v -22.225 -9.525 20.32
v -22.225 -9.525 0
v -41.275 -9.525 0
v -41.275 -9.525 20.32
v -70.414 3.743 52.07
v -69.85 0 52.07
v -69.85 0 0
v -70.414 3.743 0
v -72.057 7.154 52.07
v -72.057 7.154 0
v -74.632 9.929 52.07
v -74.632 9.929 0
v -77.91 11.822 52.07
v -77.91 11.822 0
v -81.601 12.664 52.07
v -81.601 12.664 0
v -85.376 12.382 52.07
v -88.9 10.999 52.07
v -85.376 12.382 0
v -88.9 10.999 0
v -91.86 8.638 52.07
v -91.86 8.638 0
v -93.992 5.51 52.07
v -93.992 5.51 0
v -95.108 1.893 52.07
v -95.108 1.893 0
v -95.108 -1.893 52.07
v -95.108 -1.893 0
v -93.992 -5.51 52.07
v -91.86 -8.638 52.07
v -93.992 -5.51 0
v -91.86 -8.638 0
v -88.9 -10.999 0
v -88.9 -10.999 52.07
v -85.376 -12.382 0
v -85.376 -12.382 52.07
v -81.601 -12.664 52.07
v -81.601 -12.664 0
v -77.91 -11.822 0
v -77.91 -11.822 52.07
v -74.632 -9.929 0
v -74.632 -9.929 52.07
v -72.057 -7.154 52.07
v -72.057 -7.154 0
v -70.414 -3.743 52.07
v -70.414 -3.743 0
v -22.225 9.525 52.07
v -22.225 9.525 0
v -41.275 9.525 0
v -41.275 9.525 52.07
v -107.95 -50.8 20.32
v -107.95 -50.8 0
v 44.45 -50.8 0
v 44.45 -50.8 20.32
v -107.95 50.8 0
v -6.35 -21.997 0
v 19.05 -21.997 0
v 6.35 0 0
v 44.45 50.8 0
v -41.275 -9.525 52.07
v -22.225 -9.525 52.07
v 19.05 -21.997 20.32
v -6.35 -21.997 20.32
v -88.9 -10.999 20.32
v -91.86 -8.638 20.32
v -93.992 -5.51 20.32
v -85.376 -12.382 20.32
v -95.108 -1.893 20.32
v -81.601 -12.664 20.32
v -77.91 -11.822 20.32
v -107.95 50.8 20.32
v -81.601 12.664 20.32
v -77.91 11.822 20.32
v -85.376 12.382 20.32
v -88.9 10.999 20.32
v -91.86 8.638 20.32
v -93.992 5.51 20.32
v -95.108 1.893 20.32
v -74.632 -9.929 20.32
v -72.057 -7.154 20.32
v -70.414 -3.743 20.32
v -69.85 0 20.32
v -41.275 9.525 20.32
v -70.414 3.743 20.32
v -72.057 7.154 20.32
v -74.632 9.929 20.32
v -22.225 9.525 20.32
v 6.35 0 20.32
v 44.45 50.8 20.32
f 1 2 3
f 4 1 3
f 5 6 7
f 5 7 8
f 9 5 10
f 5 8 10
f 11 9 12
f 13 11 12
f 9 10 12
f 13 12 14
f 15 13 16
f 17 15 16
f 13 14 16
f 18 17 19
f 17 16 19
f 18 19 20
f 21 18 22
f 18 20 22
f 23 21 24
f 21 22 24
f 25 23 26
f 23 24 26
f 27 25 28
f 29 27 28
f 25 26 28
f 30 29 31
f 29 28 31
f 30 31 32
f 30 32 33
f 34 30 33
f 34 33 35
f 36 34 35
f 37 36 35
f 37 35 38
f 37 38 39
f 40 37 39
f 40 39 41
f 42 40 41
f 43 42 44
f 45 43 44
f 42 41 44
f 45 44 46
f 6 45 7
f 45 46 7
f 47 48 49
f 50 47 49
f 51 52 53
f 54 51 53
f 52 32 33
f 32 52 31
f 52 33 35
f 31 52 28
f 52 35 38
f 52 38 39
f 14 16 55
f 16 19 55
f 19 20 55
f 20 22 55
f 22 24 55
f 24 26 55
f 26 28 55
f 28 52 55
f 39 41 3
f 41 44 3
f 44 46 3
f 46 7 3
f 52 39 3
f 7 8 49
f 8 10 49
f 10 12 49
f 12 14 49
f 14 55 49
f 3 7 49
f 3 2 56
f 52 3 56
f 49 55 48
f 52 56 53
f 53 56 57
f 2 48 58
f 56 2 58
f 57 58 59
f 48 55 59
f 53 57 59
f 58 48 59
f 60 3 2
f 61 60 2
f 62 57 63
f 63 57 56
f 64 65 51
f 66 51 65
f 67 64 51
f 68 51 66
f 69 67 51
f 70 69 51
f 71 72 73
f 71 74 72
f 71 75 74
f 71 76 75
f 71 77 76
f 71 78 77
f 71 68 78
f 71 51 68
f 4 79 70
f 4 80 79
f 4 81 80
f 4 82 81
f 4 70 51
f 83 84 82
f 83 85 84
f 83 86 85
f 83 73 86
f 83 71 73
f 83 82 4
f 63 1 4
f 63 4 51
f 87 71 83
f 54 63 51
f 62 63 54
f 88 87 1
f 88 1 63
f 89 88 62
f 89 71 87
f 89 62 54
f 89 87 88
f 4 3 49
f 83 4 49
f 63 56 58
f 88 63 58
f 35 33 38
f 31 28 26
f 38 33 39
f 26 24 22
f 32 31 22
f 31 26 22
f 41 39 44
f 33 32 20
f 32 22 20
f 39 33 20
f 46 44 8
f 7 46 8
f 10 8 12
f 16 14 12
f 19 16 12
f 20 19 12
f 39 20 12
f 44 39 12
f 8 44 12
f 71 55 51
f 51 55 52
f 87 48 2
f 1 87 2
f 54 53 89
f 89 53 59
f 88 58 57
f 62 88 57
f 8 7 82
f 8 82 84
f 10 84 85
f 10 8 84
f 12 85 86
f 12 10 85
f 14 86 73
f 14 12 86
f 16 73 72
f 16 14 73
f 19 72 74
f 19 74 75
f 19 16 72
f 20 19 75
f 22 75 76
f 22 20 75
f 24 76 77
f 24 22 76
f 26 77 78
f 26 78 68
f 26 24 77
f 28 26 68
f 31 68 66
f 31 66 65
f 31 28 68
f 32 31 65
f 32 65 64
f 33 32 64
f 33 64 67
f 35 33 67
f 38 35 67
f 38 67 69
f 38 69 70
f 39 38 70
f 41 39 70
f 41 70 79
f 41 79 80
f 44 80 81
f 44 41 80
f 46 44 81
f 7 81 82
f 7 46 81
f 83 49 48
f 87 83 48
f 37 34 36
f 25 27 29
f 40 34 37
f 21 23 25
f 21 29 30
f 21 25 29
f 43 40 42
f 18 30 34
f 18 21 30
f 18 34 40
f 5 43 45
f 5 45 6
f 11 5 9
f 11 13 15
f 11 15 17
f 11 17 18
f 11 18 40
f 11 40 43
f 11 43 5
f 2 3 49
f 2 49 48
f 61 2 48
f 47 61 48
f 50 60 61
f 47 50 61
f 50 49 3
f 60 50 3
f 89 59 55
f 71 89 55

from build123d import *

# Parameters (mm, degrees)
F0_R     = 12.7
F1_DEPTH = 20.32
F2_DEPTH = 52.07


with BuildPart() as f1:
    # F0 (on Top) → F1 (new body)
    with BuildSketch(Plane.XY):
        Polygon((44.45, -50.8), (44.45, 0), (44.45, 50.8), (-107.95, 50.8), (-107.95, -50.8), align=None)
        with Locations((-82.55, 0)):
            Circle(F0_R, mode=Mode.SUBTRACT)
        Polygon((-22.225, 9.525), (-22.225, 0), (-22.225, -9.525), (-41.275, -9.525), (-41.275, 0), (-41.275, 9.525), align=None, mode=Mode.SUBTRACT)
        Polygon((-6.35, -21.9970452561), (6.35, 0), (19.05, -21.9970452561), align=None, mode=Mode.SUBTRACT)
    extrude(amount=F1_DEPTH)


with BuildPart() as f2:
    # F0 (on Top) → F2 (new body)
    with BuildSketch(Plane.XY):
        Polygon((-31.75, 0), (-22.225, 0), (-22.225, 9.525), (-41.275, 9.525), (-41.275, 0), align=None)
        Polygon((-22.225, -9.525), (-22.225, 0), (-31.75, 0), (-41.275, 0), (-41.275, -9.525), align=None)
    extrude(amount=F2_DEPTH)


with BuildPart() as f2b:
    # F0 (on Top) → F2, piece 2 (new body)
    with BuildSketch(Plane.XY):
        with Locations((-82.55, 0)):
            Circle(F0_R)
    extrude(amount=F2_DEPTH)


solid = Compound([f1.part, f2.part, f2b.part])
